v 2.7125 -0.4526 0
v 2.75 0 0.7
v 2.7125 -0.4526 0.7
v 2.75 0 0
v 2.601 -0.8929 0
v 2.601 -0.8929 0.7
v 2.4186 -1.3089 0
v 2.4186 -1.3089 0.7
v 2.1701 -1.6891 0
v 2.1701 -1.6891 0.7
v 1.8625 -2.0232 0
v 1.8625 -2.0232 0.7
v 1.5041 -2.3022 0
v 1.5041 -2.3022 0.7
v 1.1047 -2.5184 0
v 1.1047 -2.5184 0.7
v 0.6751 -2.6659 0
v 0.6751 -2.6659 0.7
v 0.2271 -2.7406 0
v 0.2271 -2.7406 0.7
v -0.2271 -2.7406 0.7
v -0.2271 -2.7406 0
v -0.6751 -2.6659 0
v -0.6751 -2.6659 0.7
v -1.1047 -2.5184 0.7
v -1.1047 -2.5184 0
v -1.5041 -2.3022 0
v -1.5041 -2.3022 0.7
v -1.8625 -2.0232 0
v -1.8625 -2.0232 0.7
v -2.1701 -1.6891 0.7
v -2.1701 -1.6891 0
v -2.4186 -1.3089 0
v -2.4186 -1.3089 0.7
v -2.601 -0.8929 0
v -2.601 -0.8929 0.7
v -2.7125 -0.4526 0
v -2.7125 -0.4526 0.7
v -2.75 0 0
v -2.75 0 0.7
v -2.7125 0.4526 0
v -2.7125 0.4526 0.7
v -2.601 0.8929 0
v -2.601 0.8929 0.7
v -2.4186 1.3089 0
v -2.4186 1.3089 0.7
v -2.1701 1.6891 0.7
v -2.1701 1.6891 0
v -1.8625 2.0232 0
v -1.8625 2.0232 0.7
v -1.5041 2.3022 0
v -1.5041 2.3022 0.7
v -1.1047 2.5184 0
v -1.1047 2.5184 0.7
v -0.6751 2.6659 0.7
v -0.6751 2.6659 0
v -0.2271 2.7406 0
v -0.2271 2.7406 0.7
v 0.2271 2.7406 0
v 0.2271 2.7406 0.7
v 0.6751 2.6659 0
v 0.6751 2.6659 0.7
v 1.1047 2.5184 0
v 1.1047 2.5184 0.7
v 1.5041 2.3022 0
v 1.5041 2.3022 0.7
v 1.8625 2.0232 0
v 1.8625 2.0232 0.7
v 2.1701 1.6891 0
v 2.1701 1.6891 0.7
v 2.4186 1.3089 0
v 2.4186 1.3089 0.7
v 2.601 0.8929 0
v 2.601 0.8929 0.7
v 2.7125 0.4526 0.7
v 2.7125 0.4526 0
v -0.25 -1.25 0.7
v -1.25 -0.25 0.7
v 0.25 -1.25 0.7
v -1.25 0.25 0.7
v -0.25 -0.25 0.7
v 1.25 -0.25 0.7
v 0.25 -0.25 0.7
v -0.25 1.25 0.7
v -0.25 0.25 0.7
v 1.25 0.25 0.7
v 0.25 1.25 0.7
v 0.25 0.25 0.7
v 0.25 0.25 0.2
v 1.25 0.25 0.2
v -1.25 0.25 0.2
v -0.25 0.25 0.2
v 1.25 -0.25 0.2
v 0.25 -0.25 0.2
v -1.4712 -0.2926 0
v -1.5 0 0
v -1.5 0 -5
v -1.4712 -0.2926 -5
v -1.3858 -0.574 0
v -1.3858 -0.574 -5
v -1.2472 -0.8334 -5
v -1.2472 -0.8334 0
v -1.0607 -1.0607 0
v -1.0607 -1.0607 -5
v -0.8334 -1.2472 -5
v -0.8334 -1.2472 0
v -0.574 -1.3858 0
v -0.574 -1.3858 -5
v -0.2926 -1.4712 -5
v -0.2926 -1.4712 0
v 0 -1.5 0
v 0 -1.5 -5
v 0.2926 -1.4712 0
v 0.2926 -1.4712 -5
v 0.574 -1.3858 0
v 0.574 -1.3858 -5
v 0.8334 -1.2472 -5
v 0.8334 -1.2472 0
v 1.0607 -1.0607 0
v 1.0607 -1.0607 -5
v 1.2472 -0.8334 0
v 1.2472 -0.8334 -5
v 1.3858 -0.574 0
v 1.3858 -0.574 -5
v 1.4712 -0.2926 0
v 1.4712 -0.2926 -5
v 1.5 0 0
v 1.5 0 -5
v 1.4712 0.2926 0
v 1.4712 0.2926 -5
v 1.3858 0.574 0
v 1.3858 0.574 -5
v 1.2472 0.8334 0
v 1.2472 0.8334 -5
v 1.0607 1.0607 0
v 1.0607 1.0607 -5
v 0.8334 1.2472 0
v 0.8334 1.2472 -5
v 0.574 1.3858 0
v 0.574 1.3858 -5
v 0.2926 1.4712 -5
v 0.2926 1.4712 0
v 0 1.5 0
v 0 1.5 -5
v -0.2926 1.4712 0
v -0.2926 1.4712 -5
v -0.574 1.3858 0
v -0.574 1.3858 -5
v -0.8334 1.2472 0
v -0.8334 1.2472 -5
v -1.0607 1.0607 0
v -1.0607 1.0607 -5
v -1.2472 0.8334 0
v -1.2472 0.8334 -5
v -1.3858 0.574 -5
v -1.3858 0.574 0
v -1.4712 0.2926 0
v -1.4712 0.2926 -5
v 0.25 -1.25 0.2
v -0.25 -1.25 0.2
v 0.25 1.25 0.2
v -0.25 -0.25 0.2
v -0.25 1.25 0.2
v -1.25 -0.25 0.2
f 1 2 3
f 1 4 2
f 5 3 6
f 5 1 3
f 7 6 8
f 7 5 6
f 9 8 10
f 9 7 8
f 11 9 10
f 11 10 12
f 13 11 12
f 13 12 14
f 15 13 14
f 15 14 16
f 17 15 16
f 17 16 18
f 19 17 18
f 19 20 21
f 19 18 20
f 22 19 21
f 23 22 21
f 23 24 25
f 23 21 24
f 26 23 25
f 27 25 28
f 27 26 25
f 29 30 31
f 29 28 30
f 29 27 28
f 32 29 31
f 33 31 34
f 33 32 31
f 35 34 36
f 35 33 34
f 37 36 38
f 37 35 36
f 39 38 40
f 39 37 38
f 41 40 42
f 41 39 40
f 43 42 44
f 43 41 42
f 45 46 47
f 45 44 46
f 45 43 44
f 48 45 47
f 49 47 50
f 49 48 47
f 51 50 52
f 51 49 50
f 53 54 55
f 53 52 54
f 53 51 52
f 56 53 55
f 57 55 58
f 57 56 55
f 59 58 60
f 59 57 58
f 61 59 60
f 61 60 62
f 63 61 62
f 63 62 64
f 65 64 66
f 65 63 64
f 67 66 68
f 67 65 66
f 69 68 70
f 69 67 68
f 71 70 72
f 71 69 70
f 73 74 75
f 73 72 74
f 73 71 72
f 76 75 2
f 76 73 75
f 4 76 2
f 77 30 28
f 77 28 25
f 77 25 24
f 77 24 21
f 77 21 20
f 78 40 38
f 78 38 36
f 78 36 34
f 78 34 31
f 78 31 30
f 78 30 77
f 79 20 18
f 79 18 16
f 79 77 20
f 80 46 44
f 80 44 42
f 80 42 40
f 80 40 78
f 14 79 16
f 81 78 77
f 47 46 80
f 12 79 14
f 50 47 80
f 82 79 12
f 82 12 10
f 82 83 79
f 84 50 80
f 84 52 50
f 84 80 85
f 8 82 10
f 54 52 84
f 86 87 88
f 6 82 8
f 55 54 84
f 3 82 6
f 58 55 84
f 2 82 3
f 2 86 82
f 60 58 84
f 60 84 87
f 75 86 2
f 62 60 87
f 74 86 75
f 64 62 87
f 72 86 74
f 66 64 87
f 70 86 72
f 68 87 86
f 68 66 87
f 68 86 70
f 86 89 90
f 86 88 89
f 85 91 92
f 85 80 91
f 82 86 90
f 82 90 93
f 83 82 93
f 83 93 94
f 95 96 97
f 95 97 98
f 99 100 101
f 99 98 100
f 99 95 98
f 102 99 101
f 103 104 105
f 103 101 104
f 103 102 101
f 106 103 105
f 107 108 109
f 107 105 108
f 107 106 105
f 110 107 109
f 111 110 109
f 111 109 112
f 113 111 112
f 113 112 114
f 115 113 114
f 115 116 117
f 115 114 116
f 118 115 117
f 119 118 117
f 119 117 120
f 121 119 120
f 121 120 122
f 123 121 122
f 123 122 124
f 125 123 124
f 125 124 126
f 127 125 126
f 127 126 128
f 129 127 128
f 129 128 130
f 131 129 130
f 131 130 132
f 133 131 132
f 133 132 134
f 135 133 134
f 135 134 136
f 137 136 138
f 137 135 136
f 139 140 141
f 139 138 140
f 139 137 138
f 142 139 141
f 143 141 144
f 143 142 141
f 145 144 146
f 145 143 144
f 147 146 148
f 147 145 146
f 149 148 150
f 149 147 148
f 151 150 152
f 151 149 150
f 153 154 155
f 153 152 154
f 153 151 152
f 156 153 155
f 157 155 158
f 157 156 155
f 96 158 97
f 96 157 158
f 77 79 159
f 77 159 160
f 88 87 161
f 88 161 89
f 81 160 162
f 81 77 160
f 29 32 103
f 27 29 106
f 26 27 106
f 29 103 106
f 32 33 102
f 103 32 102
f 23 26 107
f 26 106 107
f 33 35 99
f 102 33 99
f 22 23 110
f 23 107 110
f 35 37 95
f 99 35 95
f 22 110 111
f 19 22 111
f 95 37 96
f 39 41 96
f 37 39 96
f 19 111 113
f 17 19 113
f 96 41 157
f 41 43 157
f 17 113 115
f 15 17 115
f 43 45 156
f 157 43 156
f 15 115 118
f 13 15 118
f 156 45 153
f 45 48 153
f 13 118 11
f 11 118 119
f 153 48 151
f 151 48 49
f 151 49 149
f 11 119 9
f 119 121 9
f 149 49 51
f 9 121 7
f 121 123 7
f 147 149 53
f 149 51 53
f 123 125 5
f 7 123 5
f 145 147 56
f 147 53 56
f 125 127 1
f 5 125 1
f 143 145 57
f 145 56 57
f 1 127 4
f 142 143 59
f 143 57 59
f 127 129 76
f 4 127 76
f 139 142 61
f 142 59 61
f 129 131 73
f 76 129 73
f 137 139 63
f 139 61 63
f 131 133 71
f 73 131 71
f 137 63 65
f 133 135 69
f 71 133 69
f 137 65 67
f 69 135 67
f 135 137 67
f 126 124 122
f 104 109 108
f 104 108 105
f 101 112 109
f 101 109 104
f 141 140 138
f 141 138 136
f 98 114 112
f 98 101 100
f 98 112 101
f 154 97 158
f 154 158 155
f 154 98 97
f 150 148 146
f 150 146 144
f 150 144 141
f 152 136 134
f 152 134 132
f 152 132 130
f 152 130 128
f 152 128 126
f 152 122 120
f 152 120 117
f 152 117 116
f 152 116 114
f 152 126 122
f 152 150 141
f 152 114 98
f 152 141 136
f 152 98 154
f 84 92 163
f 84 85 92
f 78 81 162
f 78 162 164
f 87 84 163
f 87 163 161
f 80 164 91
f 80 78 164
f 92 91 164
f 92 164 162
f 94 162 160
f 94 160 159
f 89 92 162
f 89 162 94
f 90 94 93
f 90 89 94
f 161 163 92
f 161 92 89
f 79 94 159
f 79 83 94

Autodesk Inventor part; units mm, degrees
ref_plane "YZ Plane" through (0, 0, 0) normal (1, 0, 0) x (0, 1, 0)
ref_plane "XZ Plane" through (0, 0, 0) normal (0, 1, 0) x (-1, 0, 0)
ref_plane "XY Plane" through (0, 0, 0) normal (0, 0, 1) x (1, 0, 0)
sketch "スケッチ1" plane through (0, 0, 0) normal (0, 0, 1) x (1, 0, 0)
  circle A0 centre (0, 0) radius 2.75
  dimension "d0" = 5.5
extrude "押し出し1" add sketch "スケッチ1" along normal blind 0.7
sketch "スケッチ2" plane through (0, 0, 0) normal (0, 0, -1) x (-1, 0, 0)
  circle A0 centre (0, 0) radius 1.5
  dimension "d3" = 3
extrude "押し出し2" add sketch "スケッチ2" along normal blind 5
sketch "スケッチ3" plane through (0, 0, 0.7) normal (0, 0, 1) x (1, 0, 0)
  line L0 (-1.25, 0.25) -> (1.25, 0.25)
  line L1 (1.25, 0.25) -> (1.25, -0.25)
  line L2 (1.25, -0.25) -> (-1.25, -0.25)
  line L3 (-1.25, -0.25) -> (-1.25, 0.25)
  line L4 (-0.25, 1.25) -> (0.25, 1.25)
  line L5 (0.25, 1.25) -> (0.25, -1.25)
  line L6 (0.25, -1.25) -> (-0.25, -1.25)
  line L7 (-0.25, -1.25) -> (-0.25, 1.25)
  line L8 (0, 0) -> (0, 1.7976)
  line L9 (0, 0) -> (2.75, 0)
  circle A0 centre (0, 0) radius 2.75 projected
  point P0 (-0.25, 0.25)
  point P1 (-0.25, -0.25)
  point P2 (0.25, -0.25)
  point P3 (0.25, 0.25)
  dimension "d6" = 0.5
  dimension "d7" = 0.5
  dimension "d8" = 2.5
  dimension "d9" = 2.5
extrude "押し出し3" cut sketch "スケッチ3" against normal blind 0.5 contours L0 L7 L2 L3 | L7 L4 L8 L0 | L0 L8 L9 L5 L2 L7 | L8 L4 L5 L0 | L0 L5 L9 L8 | L2 L5 L6 L7 | L0 L1 L9 L5 | L5 L9 L1 L2
properties part number "CSPELH-SUS-M3-5"
